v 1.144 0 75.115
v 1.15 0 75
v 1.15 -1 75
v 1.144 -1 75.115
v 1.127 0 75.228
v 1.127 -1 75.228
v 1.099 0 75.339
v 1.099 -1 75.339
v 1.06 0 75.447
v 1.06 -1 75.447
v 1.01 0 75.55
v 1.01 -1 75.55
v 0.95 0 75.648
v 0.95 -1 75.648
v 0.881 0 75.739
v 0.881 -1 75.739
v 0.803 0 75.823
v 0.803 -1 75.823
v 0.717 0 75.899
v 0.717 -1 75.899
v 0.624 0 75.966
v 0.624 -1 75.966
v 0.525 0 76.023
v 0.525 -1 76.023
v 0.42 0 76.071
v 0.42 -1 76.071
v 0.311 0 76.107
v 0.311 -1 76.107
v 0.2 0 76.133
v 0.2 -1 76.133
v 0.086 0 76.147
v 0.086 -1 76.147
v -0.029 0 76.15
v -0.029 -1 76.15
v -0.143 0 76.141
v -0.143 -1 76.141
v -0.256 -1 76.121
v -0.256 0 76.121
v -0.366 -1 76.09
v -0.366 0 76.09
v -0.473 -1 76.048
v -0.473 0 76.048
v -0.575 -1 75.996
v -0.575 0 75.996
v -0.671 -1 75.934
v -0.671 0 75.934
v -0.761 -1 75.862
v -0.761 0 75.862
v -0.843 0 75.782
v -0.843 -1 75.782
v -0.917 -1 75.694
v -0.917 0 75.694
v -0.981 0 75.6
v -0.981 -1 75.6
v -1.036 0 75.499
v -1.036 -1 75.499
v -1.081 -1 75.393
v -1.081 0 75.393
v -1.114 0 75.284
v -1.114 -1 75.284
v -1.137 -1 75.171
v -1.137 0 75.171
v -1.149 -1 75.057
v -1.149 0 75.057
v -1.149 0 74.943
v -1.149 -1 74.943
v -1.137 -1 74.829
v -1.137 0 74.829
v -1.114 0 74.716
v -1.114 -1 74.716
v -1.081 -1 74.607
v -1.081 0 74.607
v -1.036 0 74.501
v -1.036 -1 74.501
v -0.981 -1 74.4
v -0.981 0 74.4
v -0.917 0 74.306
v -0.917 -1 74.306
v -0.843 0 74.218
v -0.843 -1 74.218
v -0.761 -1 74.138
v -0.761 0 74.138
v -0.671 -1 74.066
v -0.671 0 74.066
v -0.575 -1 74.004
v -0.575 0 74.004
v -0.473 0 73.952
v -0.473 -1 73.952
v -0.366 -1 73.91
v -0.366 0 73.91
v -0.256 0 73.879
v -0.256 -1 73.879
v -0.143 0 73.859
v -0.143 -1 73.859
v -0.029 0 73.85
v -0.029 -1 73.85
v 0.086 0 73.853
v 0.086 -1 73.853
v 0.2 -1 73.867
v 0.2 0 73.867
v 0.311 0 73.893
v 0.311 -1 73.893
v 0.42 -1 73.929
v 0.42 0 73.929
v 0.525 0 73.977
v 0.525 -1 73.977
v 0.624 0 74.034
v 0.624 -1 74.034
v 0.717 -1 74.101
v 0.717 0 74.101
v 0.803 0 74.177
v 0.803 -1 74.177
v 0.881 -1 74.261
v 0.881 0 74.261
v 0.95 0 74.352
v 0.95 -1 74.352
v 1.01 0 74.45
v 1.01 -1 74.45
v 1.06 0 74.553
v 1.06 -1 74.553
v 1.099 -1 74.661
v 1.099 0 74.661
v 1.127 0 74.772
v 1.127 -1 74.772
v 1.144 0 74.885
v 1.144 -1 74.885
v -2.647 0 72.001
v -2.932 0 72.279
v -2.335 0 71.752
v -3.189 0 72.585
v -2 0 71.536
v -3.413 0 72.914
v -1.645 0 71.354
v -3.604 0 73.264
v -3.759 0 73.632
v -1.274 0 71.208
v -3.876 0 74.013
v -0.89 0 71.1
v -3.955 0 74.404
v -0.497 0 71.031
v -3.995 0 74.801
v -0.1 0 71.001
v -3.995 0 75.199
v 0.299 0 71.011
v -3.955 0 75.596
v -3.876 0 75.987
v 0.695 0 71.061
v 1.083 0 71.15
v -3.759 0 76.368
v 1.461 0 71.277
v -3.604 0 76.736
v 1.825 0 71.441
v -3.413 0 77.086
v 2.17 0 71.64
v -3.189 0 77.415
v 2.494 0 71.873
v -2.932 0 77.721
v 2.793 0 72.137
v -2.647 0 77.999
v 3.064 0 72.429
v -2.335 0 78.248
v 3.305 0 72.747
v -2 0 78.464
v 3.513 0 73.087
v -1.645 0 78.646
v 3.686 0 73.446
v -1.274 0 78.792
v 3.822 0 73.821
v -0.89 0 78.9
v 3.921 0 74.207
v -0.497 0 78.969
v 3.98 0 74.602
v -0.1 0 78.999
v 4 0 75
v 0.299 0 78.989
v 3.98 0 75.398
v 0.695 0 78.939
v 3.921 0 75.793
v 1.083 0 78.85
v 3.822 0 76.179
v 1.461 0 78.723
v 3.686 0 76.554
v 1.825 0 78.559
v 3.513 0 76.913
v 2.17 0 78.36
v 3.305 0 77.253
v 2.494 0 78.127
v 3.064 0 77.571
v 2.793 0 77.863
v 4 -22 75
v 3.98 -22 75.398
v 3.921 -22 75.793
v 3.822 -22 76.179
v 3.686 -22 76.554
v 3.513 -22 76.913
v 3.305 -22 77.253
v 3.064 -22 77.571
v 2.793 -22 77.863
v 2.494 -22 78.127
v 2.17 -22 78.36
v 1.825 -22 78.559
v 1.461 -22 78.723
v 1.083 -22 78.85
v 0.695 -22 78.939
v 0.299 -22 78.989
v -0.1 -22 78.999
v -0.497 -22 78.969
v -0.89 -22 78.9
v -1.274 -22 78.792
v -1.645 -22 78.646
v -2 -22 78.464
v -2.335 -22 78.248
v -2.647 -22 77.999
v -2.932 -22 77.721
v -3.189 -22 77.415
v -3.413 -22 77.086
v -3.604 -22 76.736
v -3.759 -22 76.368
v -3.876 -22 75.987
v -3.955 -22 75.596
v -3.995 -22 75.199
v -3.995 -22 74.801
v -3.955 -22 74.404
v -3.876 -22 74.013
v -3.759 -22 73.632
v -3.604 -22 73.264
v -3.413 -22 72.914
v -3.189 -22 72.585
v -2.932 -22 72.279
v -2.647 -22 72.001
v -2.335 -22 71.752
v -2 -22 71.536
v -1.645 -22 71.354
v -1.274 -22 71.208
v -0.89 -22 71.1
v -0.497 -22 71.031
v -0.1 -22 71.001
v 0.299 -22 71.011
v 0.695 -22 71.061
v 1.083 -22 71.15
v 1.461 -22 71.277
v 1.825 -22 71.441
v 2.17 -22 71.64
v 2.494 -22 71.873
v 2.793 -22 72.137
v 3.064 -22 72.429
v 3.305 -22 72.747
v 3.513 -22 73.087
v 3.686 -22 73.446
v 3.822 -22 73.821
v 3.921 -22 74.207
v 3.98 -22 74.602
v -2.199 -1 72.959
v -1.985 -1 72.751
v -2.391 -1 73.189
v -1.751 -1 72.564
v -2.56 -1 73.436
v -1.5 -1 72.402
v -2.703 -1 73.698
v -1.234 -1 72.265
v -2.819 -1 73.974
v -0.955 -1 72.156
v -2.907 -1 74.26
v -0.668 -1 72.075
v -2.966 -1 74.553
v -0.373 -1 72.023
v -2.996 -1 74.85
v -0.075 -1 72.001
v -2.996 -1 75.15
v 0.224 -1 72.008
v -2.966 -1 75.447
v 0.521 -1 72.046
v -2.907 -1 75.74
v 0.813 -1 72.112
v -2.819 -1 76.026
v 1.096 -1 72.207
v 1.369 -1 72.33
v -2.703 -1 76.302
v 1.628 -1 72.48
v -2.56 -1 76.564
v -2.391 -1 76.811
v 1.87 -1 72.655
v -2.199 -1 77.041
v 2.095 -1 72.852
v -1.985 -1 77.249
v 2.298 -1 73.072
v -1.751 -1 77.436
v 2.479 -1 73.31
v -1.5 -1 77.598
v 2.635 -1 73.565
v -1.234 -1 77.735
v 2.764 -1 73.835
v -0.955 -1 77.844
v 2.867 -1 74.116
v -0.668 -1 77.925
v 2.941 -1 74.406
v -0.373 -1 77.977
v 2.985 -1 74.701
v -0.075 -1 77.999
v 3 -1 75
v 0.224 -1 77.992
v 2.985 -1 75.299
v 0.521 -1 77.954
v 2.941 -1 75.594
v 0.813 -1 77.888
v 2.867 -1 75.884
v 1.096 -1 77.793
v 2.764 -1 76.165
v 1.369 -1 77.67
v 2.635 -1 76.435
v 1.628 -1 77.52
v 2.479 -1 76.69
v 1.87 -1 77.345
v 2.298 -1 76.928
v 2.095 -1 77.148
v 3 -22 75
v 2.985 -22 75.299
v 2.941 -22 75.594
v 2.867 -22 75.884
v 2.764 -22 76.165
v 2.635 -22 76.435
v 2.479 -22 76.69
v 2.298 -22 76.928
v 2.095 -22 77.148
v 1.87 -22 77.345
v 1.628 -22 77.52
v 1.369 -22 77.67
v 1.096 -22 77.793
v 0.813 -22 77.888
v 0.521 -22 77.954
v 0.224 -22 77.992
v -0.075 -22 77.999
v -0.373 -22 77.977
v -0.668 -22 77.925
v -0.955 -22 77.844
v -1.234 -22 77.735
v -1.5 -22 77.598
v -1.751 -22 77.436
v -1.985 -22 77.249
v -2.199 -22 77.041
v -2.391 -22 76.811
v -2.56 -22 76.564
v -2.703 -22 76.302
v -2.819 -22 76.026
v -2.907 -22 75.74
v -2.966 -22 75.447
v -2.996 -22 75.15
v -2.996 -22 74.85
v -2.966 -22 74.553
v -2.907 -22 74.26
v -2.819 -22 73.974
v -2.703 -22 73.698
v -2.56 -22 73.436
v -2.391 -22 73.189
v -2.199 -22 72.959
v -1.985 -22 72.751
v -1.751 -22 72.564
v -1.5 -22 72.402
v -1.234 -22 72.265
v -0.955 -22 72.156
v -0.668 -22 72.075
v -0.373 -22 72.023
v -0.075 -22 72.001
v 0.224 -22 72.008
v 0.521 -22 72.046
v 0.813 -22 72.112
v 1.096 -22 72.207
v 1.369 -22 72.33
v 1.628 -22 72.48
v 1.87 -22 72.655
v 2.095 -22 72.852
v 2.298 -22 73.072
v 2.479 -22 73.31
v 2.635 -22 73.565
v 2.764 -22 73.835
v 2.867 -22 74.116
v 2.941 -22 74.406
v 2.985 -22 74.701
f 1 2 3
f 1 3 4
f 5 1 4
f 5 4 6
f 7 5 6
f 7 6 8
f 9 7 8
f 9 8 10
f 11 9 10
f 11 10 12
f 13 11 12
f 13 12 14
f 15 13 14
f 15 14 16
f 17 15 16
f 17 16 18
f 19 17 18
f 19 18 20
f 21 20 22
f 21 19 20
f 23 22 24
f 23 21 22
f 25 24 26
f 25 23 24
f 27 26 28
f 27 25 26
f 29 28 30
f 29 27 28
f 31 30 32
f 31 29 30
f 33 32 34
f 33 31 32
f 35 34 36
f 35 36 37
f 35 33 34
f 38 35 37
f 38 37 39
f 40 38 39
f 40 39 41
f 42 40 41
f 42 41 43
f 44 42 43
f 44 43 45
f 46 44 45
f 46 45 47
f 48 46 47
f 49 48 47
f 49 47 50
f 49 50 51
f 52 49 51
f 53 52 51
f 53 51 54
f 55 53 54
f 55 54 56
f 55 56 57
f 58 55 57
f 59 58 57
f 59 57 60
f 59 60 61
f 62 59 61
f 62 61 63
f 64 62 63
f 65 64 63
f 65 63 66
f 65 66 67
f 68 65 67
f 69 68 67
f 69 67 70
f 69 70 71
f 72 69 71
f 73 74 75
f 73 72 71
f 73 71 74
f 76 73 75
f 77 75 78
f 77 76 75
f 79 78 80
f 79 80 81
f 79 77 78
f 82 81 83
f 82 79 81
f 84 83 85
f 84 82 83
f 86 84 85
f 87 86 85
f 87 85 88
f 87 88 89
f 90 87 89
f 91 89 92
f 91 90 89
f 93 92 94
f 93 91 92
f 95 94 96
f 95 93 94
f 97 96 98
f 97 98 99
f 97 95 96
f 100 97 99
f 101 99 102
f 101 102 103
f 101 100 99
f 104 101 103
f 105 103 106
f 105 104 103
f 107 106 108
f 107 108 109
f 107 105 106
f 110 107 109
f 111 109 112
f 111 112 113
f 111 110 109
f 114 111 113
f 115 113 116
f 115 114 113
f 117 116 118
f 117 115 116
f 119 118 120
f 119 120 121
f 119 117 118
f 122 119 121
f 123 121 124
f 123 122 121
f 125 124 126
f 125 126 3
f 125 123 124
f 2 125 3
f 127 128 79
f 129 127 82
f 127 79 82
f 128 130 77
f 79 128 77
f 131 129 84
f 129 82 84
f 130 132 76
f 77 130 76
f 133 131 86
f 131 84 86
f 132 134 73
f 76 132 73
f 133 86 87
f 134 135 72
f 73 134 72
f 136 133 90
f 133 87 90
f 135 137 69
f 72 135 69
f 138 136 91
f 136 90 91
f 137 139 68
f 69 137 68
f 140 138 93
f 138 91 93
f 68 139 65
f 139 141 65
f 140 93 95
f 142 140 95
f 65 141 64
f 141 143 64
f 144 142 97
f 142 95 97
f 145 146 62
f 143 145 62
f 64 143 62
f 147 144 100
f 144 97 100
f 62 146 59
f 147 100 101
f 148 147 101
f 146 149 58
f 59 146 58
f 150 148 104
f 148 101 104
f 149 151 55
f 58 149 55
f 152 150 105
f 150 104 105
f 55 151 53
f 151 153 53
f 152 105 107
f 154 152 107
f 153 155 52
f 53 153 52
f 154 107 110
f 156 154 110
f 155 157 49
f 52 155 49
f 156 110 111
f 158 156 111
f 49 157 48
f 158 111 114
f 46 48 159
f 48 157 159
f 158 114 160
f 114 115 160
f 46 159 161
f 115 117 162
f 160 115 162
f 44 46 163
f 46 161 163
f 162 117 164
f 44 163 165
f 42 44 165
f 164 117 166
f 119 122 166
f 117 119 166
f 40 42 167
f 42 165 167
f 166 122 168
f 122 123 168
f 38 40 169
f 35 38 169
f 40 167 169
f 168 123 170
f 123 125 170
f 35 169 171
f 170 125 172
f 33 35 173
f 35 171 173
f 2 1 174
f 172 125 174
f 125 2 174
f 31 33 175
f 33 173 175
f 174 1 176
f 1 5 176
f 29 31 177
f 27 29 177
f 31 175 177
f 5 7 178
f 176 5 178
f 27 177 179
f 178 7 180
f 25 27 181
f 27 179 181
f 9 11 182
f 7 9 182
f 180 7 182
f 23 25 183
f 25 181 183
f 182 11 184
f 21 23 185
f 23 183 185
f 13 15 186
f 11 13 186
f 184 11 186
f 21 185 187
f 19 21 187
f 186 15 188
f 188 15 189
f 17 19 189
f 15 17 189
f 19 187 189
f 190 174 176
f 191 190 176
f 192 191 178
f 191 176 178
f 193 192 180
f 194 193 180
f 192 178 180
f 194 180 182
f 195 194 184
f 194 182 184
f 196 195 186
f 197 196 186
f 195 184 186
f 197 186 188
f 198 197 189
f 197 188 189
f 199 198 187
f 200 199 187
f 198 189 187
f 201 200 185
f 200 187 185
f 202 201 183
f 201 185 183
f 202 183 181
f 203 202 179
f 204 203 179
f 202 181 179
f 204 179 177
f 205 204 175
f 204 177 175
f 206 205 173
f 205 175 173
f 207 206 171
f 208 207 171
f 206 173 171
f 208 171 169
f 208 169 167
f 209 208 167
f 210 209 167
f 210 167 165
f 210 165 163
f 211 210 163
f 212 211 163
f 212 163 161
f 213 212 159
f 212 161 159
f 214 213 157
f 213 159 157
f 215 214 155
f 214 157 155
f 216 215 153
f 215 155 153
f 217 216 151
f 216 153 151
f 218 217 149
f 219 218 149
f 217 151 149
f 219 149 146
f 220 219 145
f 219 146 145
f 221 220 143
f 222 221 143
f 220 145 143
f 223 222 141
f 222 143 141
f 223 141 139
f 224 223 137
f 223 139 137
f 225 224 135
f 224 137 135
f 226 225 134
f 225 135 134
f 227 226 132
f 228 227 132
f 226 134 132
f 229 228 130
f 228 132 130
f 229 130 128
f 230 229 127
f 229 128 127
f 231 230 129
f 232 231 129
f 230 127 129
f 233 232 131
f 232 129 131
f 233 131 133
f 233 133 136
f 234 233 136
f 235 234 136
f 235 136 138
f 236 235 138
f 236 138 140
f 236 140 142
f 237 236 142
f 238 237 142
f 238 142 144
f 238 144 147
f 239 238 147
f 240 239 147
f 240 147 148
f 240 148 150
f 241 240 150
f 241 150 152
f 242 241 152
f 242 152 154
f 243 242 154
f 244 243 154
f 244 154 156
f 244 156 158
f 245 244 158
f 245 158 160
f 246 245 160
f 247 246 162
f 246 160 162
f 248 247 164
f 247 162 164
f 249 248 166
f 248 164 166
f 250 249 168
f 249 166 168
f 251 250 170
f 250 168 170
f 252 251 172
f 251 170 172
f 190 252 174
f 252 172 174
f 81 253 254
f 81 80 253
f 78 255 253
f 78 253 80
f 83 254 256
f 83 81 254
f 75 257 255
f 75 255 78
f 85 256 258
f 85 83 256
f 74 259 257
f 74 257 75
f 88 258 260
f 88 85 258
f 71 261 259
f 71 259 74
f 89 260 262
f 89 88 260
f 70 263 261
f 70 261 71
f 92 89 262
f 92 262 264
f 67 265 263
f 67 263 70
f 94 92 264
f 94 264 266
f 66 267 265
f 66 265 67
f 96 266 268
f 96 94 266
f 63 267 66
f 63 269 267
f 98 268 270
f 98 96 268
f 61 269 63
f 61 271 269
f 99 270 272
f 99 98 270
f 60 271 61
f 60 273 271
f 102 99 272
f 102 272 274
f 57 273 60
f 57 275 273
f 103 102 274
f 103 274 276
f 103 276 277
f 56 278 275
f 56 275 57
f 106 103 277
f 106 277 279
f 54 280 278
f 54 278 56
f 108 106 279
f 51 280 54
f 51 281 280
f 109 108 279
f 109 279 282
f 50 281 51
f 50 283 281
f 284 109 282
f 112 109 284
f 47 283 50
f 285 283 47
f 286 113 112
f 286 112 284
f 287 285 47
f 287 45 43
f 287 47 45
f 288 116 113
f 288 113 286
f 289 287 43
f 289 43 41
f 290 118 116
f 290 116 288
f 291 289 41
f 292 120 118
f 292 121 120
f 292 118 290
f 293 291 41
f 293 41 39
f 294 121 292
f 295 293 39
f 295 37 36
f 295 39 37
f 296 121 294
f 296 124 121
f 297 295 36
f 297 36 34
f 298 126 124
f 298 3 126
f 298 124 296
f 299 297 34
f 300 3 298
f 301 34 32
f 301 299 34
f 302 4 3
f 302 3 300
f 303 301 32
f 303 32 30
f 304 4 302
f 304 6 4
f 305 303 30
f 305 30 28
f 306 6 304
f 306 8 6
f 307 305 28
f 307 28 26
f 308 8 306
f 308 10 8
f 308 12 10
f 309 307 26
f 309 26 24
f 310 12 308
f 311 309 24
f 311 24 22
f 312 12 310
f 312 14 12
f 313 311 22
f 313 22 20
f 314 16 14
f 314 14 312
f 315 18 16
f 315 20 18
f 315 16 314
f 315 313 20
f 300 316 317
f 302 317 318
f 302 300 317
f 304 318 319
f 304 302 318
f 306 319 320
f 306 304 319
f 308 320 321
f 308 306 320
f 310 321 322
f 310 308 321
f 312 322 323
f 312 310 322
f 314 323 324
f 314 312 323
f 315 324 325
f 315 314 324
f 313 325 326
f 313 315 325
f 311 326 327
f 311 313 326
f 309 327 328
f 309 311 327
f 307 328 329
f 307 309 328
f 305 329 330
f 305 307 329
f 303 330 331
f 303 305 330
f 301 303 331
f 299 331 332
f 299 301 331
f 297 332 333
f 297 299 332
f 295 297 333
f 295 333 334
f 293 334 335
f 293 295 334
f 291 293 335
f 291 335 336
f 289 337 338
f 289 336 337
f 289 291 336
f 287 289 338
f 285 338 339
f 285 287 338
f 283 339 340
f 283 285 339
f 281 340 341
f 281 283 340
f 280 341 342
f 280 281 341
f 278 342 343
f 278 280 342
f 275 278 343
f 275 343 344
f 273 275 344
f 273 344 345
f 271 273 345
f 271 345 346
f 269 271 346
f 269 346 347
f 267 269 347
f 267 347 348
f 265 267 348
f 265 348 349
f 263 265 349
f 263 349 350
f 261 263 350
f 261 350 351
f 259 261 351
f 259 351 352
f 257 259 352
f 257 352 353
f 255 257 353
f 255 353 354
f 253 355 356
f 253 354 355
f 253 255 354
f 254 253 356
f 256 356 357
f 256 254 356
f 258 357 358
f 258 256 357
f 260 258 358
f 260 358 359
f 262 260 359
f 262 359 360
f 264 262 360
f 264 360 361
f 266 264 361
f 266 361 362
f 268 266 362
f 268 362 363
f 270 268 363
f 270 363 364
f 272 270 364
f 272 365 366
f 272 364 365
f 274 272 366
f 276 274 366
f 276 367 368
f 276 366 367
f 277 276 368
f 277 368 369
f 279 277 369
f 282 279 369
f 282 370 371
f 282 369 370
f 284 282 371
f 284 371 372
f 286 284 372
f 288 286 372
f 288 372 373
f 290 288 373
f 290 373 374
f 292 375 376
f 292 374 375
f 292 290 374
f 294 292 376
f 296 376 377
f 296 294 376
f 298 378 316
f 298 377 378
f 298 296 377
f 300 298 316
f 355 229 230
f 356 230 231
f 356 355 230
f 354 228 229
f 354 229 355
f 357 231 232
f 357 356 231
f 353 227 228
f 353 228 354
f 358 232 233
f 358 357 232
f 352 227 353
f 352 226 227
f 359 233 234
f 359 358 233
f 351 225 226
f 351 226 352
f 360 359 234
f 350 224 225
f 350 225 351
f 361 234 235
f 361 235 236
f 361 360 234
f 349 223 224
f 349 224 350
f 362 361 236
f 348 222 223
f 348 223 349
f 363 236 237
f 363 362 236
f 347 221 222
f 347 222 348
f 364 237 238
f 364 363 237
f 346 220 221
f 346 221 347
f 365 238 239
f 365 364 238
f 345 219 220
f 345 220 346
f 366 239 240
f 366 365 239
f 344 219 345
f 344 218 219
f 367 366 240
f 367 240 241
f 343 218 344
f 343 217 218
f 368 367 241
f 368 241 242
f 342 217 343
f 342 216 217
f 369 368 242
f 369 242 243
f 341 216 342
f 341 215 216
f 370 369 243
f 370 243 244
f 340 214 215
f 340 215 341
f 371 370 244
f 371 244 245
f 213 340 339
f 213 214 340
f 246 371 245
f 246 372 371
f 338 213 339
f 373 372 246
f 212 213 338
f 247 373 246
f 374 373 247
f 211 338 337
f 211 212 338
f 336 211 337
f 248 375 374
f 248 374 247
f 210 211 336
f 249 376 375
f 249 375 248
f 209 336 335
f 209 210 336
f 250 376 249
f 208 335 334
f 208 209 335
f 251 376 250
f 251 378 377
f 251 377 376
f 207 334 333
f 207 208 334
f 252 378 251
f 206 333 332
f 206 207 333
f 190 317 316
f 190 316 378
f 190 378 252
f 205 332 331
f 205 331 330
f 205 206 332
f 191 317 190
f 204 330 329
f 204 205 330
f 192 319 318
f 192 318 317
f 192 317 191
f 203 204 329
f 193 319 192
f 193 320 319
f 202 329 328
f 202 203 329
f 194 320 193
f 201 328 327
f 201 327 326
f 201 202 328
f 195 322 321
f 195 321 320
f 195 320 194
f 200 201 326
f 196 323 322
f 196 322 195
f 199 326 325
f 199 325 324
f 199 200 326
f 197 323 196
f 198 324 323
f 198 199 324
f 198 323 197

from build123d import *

# Parameters (mm, degrees)
CYLINDER_R             = 3
CYLINDER_DEPTH         = 22
CYLINDER_ROLL_ANGLE    = 90
CYLINDER013_R          = 1.15
CYLINDER013_DEPTH      = 6
CYLINDER013_ROLL_ANGLE = 90
CYLINDER010_R          = 4
CYLINDER010_DEPTH      = 22
CYLINDER010_ROLL_ANGLE = 90


with BuildPart() as cylinder:
    # Cylinder → Cylinder (new body)
    with BuildSketch(Plane.XY):
        Circle(CYLINDER_R)
    extrude(amount=CYLINDER_DEPTH)


with BuildPart() as cylinder_1:
    # Cylinder roll: moved
    add(cylinder.part.rotate(Axis((0, 0, 0), (1, 0, 0)), CYLINDER_ROLL_ANGLE))


with BuildPart() as cylinder_2:
    # Cylinder placement: moved
    add(cylinder_1.part.moved(Location((0, -1, 75))))


with BuildPart() as fusion:
    # Cylinder013 → Cylinder013 (new body)
    with BuildSketch(Plane.XY):
        Circle(CYLINDER013_R)
    extrude(amount=CYLINDER013_DEPTH)


with BuildPart() as fusion_1:
    # Cylinder013 roll: moved
    add(fusion.part.rotate(Axis((0, 0, 0), (1, 0, 0)), CYLINDER013_ROLL_ANGLE))


with BuildPart() as fusion_2:
    # Cylinder013 placement: moved
    add(fusion_1.part.moved(Location((0, 5, 75))))

    # Fusion: union Cylinder
    add(cylinder_2.part)


with BuildPart() as cut002:
    # Cylinder010 → Cylinder010 (new body)
    with BuildSketch(Plane.XY):
        Circle(CYLINDER010_R)
    extrude(amount=CYLINDER010_DEPTH)


with BuildPart() as cut002_1:
    # Cylinder010 roll: moved
    add(cut002.part.rotate(Axis((0, 0, 0), (1, 0, 0)), CYLINDER010_ROLL_ANGLE))


with BuildPart() as cut002_2:
    # Cylinder010 placement: moved
    add(cut002_1.part.moved(Location((0, 0, 75))))

    # Cut002: cut Fusion
    add(fusion_2.part, mode=Mode.SUBTRACT)


solid = cut002_2.part
